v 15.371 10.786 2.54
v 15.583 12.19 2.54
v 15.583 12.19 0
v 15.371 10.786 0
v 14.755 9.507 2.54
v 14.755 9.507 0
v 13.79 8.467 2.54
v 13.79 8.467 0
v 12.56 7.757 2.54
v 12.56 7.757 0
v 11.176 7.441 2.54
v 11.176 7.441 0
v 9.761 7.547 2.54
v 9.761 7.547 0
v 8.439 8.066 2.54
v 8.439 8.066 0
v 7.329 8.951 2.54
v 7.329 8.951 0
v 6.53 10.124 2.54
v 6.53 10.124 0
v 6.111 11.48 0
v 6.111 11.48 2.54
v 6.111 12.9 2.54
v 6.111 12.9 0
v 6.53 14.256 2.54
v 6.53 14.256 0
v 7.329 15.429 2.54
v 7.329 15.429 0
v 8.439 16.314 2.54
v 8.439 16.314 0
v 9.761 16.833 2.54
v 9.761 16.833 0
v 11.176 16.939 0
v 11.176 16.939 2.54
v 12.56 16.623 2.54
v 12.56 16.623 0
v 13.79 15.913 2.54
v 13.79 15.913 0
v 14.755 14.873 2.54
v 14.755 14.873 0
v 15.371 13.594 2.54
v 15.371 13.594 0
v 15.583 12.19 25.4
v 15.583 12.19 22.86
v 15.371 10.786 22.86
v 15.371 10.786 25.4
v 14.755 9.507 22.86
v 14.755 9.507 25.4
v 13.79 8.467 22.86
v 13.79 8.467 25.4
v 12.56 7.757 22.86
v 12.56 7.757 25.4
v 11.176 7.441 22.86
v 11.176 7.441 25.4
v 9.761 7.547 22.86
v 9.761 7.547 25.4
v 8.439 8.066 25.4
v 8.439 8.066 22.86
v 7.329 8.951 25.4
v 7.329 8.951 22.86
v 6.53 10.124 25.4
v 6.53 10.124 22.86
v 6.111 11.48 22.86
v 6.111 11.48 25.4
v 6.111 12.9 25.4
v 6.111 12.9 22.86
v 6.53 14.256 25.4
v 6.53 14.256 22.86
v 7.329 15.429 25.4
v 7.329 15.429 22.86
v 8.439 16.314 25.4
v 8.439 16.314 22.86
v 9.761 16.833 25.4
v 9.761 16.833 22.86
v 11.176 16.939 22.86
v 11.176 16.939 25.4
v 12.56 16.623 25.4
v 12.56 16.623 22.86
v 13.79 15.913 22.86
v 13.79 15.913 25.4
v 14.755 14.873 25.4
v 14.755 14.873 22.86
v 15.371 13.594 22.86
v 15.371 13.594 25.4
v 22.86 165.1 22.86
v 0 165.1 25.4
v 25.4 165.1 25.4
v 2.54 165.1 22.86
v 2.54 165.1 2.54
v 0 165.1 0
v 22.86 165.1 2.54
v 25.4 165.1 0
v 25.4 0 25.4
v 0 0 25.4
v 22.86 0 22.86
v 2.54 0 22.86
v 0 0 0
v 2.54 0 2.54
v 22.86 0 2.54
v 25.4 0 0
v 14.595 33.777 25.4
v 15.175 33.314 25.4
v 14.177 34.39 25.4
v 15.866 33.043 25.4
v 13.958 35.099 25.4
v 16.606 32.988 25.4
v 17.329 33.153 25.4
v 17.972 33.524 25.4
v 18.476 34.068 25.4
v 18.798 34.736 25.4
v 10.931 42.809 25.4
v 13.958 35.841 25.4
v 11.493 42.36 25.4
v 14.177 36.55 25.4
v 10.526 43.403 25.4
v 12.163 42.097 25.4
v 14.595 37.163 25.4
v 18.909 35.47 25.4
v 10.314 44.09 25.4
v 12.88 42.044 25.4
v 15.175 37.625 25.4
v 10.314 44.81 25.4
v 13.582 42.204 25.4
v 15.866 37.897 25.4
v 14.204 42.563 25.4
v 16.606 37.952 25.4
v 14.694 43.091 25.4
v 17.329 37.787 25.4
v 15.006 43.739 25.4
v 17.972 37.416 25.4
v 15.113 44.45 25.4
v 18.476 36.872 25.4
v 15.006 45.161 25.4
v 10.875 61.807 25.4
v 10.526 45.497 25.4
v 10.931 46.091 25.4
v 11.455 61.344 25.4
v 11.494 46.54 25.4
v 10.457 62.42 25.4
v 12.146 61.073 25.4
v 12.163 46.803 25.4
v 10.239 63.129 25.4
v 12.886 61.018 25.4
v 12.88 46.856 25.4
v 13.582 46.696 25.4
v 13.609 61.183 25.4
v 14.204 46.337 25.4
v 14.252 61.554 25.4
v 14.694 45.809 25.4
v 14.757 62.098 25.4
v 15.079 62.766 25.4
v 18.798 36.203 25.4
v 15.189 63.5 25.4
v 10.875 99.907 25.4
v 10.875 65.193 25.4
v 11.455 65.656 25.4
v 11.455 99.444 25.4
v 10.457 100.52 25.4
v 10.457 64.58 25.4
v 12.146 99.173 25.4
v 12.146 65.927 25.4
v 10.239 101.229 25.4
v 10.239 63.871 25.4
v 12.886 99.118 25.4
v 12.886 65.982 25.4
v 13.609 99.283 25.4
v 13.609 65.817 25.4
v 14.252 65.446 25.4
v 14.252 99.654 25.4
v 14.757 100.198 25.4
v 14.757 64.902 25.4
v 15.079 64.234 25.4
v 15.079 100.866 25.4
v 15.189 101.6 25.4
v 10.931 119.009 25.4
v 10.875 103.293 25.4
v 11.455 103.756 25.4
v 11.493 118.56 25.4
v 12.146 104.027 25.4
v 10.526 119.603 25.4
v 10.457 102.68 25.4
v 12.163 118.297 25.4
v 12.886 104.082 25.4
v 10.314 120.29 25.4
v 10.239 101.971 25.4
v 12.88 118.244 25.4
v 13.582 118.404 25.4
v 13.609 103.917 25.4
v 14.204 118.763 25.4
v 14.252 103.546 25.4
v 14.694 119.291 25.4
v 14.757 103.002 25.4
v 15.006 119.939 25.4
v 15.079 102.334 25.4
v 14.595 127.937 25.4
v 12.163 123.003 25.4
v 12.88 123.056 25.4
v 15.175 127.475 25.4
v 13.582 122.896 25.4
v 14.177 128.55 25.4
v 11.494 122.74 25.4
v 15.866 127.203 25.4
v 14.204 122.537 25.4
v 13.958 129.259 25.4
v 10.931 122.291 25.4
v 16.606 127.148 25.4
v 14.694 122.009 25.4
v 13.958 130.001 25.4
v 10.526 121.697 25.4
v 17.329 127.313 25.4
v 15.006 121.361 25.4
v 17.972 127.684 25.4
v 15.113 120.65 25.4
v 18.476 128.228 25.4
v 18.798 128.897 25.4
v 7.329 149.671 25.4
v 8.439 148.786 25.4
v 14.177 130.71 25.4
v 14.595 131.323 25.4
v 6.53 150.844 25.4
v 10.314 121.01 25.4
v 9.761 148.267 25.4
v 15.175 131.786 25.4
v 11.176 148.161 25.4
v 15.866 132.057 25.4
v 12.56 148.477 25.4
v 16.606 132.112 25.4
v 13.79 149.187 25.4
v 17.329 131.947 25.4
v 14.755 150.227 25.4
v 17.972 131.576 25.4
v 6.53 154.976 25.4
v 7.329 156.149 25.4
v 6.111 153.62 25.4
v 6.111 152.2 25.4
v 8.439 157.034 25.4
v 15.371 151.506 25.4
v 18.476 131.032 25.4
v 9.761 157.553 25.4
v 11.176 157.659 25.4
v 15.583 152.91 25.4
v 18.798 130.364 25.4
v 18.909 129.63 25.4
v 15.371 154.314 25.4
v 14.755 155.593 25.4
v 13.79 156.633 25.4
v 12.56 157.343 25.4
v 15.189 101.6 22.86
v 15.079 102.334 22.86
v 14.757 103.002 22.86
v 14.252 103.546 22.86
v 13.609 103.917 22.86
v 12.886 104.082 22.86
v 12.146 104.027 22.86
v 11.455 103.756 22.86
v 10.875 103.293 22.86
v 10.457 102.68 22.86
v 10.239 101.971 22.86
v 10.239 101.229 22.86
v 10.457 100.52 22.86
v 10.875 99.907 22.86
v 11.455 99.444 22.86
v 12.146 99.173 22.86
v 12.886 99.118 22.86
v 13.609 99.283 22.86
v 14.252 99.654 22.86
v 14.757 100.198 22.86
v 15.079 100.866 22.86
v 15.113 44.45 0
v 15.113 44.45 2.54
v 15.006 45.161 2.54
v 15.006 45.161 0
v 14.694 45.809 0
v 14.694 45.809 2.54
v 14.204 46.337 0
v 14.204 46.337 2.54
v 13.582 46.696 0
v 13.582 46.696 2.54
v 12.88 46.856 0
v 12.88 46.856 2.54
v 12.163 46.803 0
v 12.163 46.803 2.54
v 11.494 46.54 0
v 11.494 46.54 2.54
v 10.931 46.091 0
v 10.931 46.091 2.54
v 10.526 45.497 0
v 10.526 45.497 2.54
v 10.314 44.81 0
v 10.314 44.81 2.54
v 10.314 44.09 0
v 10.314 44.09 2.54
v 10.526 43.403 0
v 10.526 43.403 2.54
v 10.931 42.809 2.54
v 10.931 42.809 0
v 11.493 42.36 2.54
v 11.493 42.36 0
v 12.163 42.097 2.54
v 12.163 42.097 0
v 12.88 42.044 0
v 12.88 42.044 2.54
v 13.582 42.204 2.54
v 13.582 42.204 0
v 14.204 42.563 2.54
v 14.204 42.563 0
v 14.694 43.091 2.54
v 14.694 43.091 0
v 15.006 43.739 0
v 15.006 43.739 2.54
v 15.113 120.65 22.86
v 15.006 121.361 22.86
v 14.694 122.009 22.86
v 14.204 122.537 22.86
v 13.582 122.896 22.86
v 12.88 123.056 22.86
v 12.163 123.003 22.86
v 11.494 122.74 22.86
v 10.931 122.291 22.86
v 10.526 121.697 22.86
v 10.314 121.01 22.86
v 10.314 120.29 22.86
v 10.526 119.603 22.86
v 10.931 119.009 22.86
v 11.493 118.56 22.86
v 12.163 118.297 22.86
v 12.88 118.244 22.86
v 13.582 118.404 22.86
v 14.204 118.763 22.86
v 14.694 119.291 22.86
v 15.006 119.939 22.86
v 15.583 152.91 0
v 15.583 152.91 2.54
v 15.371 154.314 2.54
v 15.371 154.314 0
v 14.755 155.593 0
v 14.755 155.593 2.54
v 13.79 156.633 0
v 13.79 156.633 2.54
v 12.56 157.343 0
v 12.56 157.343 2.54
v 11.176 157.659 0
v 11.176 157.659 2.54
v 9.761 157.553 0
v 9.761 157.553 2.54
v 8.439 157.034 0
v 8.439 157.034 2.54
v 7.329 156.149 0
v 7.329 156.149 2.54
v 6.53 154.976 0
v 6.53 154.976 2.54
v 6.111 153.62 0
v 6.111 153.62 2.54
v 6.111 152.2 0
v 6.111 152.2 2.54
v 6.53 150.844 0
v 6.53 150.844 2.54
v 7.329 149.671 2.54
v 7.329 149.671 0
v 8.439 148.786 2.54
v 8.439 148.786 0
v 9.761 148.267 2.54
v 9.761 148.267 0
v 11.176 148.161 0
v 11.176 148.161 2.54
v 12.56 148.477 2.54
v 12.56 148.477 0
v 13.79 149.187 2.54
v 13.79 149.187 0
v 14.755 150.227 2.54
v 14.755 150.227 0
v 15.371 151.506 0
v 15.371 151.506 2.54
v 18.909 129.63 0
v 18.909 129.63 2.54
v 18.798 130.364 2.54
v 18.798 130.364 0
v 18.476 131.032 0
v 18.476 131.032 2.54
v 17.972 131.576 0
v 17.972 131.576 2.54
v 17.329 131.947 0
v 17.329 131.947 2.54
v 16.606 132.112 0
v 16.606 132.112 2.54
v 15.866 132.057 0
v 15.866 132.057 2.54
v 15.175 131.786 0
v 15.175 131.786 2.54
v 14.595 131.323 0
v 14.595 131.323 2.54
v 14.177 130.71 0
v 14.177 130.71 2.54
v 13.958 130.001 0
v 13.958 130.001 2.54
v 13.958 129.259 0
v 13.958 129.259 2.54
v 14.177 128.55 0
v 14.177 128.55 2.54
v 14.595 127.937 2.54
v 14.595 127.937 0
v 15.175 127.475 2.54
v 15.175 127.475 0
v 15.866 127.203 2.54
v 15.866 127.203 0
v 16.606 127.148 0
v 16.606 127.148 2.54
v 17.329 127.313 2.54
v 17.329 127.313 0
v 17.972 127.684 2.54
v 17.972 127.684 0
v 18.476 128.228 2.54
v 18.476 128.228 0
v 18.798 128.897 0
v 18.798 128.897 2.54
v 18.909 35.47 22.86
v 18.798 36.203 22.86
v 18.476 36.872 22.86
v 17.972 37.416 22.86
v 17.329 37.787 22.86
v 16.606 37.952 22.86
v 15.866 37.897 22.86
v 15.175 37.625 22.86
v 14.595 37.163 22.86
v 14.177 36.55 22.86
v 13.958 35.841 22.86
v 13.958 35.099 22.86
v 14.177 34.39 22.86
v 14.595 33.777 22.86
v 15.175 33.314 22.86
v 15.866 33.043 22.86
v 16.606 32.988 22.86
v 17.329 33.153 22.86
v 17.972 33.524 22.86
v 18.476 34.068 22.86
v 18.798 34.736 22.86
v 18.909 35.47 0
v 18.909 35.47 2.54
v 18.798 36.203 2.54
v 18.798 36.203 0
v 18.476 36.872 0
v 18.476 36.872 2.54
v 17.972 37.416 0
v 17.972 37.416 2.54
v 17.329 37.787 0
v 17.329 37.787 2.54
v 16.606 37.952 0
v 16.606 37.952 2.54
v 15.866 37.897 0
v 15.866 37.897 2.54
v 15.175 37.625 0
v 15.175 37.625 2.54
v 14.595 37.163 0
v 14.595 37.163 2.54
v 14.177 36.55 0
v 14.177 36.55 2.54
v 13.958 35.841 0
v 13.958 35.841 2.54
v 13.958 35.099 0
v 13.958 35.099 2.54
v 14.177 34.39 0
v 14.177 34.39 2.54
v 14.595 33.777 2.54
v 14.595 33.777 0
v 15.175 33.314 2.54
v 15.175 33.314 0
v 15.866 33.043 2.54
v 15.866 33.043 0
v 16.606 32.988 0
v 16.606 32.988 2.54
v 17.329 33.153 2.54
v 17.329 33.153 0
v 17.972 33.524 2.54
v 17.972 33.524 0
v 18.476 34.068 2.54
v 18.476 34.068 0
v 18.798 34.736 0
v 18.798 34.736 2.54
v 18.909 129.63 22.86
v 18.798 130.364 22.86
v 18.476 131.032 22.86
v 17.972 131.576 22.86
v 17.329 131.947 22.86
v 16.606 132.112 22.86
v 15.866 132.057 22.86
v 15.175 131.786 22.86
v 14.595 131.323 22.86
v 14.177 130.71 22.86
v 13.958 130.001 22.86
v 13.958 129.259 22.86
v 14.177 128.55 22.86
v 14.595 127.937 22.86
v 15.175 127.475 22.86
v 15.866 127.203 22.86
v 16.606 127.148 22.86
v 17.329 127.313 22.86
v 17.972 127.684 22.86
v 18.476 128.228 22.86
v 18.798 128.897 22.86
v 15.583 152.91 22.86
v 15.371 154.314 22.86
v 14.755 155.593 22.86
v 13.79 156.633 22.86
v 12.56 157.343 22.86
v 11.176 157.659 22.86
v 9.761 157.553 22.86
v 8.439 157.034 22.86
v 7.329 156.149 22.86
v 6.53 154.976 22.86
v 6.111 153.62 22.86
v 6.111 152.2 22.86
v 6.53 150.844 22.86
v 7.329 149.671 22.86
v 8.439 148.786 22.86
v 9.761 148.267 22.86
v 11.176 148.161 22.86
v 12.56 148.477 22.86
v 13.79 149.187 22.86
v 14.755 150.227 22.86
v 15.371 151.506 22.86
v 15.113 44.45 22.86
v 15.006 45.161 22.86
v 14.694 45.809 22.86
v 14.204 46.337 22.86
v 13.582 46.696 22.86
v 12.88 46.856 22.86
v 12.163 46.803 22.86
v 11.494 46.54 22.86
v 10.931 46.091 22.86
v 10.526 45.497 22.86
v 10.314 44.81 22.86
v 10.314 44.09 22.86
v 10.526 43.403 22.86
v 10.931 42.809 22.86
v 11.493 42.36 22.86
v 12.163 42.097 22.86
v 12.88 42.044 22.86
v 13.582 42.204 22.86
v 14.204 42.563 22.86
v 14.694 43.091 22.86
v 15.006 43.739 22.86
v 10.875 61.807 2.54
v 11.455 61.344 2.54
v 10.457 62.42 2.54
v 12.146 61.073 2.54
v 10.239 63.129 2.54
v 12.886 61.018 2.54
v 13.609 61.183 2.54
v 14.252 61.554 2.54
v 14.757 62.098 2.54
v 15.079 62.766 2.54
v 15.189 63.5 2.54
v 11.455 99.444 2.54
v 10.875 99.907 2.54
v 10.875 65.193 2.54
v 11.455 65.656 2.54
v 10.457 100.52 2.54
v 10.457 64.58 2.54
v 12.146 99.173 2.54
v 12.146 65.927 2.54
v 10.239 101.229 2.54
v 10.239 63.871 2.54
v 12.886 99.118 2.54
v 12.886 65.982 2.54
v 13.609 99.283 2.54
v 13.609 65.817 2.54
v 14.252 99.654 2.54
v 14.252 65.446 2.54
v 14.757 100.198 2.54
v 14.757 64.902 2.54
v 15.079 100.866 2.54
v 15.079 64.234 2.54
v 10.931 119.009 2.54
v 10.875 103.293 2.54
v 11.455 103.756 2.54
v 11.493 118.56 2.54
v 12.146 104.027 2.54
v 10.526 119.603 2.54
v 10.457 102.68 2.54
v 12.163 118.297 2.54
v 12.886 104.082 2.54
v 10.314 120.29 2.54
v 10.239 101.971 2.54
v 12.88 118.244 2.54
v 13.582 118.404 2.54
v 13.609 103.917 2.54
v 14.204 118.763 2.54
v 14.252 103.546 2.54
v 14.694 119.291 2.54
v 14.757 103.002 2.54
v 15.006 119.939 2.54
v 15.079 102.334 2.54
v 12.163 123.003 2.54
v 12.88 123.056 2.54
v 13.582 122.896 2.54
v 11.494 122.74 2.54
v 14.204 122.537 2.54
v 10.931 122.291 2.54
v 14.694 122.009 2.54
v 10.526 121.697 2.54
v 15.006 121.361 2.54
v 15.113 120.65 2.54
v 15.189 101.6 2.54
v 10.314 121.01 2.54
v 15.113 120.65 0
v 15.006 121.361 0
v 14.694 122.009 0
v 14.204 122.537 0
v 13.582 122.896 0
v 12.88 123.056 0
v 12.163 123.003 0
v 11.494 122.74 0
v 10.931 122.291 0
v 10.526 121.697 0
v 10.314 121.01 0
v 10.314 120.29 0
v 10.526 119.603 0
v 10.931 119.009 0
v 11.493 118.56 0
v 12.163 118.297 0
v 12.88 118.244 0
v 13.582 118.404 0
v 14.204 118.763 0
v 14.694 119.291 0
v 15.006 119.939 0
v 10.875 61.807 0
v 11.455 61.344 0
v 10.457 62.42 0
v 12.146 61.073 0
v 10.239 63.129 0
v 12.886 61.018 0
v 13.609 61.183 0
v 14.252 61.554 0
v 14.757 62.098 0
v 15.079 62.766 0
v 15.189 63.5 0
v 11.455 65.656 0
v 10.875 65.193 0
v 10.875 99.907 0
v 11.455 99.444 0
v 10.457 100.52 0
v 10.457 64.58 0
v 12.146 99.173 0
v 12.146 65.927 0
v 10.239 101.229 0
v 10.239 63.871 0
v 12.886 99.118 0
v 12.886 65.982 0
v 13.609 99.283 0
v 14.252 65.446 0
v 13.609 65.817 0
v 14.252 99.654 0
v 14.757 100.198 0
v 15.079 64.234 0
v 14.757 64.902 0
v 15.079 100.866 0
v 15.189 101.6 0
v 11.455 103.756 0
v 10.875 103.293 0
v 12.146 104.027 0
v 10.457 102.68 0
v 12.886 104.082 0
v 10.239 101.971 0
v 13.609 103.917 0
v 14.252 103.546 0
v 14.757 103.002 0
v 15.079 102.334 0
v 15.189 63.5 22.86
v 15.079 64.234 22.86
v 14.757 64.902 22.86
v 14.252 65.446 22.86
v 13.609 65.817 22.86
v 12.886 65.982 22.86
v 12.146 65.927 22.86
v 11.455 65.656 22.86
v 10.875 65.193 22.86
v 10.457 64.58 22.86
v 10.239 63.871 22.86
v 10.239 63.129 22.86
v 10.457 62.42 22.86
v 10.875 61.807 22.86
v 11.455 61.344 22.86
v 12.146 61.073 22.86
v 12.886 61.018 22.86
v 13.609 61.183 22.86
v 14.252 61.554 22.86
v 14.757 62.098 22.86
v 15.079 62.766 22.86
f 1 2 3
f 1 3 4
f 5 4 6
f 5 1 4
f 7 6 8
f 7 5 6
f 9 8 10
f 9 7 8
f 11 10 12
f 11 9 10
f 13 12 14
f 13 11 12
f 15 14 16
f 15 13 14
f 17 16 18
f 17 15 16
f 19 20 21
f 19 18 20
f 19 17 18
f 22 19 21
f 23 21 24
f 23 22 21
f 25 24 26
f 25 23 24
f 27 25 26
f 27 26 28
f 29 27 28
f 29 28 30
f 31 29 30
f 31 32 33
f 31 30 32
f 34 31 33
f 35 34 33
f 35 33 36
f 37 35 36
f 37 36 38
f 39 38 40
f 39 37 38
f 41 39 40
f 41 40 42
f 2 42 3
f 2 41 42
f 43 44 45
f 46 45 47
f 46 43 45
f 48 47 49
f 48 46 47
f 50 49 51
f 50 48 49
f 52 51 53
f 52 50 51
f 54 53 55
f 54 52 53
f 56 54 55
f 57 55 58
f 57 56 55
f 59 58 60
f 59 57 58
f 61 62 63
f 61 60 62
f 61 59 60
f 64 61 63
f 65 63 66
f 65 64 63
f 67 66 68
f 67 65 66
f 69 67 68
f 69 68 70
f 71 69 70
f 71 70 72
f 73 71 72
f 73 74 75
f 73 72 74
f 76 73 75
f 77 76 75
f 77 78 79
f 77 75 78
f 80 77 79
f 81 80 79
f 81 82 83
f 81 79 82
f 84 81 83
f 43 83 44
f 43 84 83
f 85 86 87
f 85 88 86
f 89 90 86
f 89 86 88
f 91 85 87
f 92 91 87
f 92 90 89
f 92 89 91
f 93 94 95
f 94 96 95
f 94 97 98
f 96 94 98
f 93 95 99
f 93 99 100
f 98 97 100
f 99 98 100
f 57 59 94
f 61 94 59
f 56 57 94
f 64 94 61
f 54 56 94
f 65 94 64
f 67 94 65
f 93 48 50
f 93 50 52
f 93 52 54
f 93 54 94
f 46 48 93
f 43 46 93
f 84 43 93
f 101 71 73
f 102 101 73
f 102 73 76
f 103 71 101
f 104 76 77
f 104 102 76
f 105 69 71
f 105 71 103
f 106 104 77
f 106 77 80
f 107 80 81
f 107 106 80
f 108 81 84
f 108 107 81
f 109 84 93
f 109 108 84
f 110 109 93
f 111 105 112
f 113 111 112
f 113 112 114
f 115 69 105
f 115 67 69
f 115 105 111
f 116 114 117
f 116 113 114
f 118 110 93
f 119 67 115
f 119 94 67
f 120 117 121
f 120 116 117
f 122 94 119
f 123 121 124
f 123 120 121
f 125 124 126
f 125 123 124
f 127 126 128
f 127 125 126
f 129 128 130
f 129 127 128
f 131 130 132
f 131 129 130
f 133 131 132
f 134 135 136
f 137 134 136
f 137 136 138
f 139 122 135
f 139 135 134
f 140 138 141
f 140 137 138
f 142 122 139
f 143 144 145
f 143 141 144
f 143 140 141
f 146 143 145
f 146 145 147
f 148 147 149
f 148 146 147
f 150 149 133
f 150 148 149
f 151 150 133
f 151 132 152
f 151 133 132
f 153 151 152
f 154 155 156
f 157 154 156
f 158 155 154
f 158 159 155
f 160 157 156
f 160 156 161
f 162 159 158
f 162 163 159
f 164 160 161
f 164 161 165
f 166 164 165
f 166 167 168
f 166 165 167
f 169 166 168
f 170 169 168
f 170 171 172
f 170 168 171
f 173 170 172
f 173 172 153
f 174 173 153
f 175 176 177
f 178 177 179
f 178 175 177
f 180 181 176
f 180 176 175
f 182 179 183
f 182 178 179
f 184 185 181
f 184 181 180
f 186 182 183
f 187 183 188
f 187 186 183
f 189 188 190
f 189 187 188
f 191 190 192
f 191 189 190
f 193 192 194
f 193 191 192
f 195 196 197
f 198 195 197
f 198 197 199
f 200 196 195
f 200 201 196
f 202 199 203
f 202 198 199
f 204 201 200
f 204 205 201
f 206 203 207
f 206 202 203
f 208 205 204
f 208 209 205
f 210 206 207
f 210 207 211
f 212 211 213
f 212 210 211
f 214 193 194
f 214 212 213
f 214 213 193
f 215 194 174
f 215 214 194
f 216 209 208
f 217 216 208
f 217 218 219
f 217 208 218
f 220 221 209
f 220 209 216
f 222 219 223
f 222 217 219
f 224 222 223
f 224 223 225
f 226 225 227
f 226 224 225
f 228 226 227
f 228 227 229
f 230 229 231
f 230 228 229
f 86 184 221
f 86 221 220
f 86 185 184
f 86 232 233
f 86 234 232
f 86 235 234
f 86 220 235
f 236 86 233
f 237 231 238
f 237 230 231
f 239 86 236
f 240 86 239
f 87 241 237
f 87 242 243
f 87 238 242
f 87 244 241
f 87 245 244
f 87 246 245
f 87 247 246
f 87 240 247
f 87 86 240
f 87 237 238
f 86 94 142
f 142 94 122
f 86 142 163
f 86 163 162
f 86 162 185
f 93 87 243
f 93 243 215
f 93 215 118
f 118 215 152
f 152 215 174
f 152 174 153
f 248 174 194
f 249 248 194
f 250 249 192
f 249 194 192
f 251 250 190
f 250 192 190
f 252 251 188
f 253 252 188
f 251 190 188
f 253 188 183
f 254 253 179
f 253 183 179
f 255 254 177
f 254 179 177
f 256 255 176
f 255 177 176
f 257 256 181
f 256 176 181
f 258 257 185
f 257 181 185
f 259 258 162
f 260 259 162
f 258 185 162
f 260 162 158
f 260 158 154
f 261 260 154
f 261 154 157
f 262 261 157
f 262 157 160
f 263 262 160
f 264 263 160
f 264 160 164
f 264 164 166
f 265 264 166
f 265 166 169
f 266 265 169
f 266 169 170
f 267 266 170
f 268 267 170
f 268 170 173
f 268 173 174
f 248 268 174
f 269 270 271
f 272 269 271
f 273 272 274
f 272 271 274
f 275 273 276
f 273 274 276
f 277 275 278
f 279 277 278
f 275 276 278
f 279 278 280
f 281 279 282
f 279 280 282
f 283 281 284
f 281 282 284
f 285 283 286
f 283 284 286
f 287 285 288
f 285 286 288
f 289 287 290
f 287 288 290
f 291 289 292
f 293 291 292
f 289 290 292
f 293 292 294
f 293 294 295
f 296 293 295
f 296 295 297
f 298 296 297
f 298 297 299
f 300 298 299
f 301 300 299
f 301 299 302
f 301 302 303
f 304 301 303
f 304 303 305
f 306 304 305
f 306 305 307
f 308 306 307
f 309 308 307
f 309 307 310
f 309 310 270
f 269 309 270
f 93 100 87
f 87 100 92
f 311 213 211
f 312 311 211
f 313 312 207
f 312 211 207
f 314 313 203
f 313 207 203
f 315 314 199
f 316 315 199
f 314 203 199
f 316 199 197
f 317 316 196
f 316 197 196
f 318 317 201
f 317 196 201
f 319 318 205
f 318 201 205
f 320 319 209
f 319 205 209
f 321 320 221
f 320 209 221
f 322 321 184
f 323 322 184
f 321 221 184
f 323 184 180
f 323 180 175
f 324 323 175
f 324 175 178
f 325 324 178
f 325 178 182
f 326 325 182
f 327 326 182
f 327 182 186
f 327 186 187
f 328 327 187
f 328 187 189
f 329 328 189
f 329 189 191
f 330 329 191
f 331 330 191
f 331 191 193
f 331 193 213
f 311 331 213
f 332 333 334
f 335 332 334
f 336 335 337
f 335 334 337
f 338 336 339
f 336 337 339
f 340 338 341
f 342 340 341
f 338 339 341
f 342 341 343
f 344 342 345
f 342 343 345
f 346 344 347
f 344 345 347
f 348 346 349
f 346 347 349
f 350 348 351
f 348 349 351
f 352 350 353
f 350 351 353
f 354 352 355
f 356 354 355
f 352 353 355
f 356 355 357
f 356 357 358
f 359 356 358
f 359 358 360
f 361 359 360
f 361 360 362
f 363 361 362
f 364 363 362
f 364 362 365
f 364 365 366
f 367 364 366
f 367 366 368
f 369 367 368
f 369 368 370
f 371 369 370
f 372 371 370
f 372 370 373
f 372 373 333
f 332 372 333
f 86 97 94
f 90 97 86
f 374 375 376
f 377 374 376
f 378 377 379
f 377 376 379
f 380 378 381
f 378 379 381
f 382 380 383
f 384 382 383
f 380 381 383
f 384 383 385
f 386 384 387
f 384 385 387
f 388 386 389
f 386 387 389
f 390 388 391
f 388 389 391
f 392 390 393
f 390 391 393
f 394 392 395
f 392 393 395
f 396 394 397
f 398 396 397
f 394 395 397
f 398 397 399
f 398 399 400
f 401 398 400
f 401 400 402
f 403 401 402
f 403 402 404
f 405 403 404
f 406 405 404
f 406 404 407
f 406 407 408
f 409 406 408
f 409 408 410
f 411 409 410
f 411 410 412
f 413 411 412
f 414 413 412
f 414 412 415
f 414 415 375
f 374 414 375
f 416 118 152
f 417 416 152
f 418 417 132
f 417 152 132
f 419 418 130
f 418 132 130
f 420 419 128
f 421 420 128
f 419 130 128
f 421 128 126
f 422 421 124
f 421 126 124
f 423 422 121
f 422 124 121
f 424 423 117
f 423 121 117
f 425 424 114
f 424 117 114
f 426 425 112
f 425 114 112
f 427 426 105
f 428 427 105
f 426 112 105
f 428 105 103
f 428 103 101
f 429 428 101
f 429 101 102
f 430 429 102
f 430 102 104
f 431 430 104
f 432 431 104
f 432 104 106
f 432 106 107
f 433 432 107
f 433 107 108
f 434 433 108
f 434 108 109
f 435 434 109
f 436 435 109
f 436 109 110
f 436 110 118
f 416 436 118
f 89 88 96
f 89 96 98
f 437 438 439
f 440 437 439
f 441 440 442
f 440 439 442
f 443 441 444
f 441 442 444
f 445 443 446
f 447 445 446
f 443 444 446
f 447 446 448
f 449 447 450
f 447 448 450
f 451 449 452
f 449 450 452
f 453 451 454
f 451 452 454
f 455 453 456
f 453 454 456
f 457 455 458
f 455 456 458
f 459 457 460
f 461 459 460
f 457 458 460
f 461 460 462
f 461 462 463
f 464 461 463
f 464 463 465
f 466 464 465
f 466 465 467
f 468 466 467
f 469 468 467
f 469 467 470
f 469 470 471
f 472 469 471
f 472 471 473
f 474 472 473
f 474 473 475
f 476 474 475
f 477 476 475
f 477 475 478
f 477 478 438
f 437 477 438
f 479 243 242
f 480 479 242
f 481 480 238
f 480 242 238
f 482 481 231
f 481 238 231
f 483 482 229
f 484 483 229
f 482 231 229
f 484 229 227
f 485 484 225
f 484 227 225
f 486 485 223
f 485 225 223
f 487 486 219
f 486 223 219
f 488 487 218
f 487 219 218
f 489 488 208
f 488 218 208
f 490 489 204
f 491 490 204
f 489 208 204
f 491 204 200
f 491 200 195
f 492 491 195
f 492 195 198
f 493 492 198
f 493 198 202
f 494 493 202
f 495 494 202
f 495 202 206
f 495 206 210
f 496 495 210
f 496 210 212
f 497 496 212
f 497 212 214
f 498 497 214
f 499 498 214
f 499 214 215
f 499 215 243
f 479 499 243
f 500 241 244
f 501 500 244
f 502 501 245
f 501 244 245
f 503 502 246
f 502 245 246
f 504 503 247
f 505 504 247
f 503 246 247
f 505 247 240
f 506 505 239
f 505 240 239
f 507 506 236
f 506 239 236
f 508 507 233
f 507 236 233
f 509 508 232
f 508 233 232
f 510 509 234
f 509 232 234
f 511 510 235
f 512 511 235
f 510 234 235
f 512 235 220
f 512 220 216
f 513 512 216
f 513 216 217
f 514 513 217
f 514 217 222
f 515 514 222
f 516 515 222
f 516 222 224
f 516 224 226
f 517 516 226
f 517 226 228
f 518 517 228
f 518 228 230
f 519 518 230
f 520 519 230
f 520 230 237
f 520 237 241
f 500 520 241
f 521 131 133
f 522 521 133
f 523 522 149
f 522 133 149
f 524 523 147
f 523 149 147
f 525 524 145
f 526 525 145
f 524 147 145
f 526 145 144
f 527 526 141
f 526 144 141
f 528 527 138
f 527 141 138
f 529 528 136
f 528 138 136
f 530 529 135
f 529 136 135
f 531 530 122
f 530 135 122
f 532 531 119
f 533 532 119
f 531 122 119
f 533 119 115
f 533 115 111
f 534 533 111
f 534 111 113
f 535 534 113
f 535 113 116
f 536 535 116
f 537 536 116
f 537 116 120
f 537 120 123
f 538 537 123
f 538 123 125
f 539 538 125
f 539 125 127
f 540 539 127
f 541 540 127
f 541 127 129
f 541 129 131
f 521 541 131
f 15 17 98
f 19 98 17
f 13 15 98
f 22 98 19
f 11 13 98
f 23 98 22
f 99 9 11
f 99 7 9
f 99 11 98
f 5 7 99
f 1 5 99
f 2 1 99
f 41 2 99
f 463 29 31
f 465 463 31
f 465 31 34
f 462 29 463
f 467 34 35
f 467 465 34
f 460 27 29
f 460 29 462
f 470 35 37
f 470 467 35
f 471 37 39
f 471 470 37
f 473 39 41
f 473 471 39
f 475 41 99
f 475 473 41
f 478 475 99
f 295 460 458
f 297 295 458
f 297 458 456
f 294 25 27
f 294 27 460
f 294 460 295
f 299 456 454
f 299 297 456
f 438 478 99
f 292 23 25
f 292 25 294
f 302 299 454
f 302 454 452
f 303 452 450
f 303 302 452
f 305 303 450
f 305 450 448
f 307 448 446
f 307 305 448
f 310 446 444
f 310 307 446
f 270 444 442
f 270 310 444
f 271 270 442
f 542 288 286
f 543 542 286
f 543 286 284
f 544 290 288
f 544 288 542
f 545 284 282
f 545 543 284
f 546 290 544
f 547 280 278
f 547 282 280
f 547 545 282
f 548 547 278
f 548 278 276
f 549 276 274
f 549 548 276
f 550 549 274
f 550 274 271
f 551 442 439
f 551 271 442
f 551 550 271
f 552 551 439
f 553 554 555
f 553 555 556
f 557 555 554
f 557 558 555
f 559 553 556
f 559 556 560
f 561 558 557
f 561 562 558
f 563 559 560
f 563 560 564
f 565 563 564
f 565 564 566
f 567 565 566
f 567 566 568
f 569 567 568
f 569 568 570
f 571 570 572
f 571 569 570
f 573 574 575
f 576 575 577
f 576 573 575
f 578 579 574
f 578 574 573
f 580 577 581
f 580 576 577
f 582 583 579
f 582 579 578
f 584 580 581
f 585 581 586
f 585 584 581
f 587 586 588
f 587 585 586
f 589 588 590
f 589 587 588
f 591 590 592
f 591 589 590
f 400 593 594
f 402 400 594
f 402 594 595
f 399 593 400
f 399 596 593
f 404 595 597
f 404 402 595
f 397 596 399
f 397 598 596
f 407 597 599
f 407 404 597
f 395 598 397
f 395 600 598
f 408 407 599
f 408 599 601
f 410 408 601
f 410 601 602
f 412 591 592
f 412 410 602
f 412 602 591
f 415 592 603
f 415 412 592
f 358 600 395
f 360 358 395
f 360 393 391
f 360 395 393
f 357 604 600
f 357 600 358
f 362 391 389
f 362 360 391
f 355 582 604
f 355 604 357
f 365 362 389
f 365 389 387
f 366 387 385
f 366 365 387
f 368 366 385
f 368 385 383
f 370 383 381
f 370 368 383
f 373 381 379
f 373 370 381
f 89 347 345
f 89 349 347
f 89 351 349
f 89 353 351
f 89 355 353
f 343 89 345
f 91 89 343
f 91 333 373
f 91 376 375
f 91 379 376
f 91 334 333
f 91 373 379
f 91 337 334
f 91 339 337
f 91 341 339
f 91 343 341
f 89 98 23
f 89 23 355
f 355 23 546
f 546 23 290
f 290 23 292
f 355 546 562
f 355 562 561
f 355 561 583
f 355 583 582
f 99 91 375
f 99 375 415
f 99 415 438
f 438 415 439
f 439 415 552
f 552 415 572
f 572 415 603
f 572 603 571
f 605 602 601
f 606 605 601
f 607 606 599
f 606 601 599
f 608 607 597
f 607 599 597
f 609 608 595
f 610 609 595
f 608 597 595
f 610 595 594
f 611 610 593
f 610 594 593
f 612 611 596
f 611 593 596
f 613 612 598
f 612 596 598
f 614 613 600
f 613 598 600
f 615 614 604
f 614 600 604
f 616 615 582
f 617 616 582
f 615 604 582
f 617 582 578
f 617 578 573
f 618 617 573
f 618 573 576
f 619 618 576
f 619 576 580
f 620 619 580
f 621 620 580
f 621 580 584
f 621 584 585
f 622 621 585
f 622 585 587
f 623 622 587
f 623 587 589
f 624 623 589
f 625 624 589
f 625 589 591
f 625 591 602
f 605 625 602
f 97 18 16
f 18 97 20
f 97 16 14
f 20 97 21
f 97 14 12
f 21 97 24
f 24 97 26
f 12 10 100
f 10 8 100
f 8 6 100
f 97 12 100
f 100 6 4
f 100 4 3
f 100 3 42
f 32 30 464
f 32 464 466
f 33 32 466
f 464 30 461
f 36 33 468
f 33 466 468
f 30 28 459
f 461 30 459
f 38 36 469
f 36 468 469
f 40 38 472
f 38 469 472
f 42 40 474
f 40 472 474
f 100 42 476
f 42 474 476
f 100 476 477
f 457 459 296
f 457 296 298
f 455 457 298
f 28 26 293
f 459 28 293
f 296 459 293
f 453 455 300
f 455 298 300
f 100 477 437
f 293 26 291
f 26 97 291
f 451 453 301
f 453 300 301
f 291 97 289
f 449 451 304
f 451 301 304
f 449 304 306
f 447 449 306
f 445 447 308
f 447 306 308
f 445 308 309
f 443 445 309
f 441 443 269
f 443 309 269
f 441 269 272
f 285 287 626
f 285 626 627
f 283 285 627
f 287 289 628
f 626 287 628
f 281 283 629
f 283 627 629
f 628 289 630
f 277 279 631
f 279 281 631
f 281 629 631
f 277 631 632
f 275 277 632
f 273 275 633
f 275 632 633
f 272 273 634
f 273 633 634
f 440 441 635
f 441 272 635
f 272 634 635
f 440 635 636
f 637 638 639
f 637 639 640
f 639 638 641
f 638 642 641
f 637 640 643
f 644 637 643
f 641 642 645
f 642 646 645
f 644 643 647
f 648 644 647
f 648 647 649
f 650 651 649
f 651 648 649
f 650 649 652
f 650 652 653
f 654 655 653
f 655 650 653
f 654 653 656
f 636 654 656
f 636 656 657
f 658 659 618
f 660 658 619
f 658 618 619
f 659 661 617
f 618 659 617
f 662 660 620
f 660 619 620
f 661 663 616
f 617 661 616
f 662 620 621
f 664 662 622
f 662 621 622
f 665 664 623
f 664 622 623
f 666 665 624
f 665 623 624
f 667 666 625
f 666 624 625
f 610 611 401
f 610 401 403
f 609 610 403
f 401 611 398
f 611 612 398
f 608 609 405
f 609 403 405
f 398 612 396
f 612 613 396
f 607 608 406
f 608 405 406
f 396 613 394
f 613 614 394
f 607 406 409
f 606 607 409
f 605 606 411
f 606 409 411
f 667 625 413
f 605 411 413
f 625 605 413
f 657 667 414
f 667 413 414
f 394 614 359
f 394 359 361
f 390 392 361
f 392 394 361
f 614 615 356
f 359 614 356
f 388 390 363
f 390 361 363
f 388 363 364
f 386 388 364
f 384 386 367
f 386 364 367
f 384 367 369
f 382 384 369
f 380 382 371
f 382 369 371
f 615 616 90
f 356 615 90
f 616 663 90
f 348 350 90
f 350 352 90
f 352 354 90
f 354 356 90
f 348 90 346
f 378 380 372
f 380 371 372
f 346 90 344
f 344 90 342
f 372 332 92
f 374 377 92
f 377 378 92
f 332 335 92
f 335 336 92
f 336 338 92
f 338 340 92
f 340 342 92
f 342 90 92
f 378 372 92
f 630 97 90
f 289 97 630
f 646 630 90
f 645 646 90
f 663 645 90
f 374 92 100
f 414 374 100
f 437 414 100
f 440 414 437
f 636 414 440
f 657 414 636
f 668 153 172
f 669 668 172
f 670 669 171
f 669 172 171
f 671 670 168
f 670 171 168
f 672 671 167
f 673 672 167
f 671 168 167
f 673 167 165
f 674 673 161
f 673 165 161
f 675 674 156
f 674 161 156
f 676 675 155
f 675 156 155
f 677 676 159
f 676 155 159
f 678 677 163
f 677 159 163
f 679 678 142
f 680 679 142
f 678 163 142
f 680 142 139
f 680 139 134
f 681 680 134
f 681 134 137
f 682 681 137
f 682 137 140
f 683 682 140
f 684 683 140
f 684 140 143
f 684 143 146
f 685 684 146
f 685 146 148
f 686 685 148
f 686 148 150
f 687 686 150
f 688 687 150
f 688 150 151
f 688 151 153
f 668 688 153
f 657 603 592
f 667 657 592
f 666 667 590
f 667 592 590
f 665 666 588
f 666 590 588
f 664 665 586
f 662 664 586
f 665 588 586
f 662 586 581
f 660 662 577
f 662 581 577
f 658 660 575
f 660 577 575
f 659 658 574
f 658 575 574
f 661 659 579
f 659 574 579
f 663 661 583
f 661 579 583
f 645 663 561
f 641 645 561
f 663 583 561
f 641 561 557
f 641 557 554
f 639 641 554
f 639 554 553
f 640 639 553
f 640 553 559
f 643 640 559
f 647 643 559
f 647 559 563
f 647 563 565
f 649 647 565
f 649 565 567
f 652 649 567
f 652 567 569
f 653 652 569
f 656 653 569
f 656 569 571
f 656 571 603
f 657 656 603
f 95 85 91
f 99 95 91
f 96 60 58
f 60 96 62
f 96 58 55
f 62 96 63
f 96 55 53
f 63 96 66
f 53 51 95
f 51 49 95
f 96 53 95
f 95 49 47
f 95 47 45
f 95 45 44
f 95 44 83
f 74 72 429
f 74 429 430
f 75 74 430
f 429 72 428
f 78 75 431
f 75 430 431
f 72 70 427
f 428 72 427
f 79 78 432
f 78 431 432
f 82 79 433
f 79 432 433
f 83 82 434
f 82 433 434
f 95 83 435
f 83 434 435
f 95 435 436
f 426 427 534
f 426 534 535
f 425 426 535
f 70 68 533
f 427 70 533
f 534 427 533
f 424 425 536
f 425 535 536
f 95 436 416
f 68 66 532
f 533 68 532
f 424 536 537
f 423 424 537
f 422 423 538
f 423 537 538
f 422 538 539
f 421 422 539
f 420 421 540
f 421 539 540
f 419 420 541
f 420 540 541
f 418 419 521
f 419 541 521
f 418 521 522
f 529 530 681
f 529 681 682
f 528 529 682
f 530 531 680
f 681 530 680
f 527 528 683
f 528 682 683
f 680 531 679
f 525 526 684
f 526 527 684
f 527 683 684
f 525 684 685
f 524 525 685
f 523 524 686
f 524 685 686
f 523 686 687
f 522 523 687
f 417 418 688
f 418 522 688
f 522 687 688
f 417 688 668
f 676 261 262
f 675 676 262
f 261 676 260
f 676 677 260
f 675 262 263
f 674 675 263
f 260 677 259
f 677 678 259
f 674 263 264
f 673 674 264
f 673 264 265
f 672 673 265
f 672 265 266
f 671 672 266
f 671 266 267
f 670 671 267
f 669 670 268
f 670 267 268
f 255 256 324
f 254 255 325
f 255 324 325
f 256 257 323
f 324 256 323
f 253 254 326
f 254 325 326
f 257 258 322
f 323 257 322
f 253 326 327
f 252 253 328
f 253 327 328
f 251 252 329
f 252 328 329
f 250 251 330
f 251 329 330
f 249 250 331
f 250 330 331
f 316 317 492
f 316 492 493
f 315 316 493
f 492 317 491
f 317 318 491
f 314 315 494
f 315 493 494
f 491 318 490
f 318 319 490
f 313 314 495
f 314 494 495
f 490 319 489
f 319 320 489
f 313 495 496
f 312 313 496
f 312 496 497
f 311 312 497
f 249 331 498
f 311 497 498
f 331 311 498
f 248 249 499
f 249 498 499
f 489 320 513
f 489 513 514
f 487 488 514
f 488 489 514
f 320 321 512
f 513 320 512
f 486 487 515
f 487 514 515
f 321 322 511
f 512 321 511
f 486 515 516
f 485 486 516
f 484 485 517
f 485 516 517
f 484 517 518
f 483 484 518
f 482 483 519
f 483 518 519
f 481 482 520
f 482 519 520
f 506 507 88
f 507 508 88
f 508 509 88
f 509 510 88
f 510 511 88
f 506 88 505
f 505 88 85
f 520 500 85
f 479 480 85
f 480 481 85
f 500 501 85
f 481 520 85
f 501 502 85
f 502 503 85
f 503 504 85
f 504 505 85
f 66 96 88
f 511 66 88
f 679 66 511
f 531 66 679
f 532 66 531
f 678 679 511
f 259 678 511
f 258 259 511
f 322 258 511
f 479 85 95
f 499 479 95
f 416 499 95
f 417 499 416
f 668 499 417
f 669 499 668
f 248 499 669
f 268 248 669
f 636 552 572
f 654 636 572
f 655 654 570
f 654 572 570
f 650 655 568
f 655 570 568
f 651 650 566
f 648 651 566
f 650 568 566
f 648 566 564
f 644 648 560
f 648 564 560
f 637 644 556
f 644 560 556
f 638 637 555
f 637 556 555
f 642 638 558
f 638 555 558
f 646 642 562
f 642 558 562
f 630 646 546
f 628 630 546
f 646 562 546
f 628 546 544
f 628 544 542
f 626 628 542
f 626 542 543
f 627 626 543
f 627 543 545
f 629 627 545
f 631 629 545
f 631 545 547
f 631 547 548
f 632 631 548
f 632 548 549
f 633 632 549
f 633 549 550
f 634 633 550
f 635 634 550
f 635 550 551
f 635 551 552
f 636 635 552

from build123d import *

# Parameters (mm, degrees)
SKETCH1_W           = 25.4
SKETCH1_H           = 165.1
BOSS_EXTRUDE1_DEPTH = 25.4
SKETCH2_W           = 20.32
SKETCH2_H           = 20.32
CUT_EXTRUDE1_DEPTH  = 166.1
SKETCH4_R           = 4.7625
CUT_EXTRUDE2_DEPTH  = 26.4
SKETCH8_R           = 2.4892
SKETCH8_R_2         = 2.413
CUT_EXTRUDE4_DEPTH  = 26.4


with BuildPart() as part:
    # Sketch1 → Boss-Extrude1 (new body)
    with BuildSketch(Plane.XY):
        with Locations((12.7, 82.55)):
            Rectangle(SKETCH1_W, SKETCH1_H)
    extrude(amount=BOSS_EXTRUDE1_DEPTH)

    # Sketch2 → Cut-Extrude1 (cut, through all)
    with BuildSketch(Plane(origin=(0, 165.1, 0), x_dir=(1, 0, 0), z_dir=(0, 1, 0))):
        with Locations((12.7, -12.7)):
            Rectangle(SKETCH2_W, SKETCH2_H)
    extrude(amount=-CUT_EXTRUDE1_DEPTH, mode=Mode.SUBTRACT)

    # Sketch4 → Cut-Extrude2 (cut, through all)
    with BuildSketch(Plane.XY.offset(25.4)):
        with Locations((10.82039492, 152.91000025)):
            Circle(SKETCH4_R)
    cut_extrude2 = extrude(amount=-CUT_EXTRUDE2_DEPTH, mode=Mode.SUBTRACT)

    # Mirror1: Cut-Extrude2 across plane
    add(cut_extrude2.mirror(Plane.ZX.offset(82.55)), mode=Mode.SUBTRACT)

    # Sketch8 → Cut-Extrude4 (cut, through all)
    with BuildSketch(Plane.XY.offset(25.4)):
        with Locations((12.7, 63.5)):
            Circle(SKETCH8_R)
        with Locations((12.7, 44.45)):
            Circle(SKETCH8_R_2)
        with Locations((16.419743879, 35.469743879)):
            Circle(SKETCH8_R)
        with Locations((12.7, 101.6)):
            Circle(SKETCH8_R)
        with Locations((12.7, 120.65)):
            Circle(SKETCH8_R_2)
        with Locations((16.419743879, 129.630256121)):
            Circle(SKETCH8_R)
    extrude(amount=-CUT_EXTRUDE4_DEPTH, mode=Mode.SUBTRACT)


solid = part.part
